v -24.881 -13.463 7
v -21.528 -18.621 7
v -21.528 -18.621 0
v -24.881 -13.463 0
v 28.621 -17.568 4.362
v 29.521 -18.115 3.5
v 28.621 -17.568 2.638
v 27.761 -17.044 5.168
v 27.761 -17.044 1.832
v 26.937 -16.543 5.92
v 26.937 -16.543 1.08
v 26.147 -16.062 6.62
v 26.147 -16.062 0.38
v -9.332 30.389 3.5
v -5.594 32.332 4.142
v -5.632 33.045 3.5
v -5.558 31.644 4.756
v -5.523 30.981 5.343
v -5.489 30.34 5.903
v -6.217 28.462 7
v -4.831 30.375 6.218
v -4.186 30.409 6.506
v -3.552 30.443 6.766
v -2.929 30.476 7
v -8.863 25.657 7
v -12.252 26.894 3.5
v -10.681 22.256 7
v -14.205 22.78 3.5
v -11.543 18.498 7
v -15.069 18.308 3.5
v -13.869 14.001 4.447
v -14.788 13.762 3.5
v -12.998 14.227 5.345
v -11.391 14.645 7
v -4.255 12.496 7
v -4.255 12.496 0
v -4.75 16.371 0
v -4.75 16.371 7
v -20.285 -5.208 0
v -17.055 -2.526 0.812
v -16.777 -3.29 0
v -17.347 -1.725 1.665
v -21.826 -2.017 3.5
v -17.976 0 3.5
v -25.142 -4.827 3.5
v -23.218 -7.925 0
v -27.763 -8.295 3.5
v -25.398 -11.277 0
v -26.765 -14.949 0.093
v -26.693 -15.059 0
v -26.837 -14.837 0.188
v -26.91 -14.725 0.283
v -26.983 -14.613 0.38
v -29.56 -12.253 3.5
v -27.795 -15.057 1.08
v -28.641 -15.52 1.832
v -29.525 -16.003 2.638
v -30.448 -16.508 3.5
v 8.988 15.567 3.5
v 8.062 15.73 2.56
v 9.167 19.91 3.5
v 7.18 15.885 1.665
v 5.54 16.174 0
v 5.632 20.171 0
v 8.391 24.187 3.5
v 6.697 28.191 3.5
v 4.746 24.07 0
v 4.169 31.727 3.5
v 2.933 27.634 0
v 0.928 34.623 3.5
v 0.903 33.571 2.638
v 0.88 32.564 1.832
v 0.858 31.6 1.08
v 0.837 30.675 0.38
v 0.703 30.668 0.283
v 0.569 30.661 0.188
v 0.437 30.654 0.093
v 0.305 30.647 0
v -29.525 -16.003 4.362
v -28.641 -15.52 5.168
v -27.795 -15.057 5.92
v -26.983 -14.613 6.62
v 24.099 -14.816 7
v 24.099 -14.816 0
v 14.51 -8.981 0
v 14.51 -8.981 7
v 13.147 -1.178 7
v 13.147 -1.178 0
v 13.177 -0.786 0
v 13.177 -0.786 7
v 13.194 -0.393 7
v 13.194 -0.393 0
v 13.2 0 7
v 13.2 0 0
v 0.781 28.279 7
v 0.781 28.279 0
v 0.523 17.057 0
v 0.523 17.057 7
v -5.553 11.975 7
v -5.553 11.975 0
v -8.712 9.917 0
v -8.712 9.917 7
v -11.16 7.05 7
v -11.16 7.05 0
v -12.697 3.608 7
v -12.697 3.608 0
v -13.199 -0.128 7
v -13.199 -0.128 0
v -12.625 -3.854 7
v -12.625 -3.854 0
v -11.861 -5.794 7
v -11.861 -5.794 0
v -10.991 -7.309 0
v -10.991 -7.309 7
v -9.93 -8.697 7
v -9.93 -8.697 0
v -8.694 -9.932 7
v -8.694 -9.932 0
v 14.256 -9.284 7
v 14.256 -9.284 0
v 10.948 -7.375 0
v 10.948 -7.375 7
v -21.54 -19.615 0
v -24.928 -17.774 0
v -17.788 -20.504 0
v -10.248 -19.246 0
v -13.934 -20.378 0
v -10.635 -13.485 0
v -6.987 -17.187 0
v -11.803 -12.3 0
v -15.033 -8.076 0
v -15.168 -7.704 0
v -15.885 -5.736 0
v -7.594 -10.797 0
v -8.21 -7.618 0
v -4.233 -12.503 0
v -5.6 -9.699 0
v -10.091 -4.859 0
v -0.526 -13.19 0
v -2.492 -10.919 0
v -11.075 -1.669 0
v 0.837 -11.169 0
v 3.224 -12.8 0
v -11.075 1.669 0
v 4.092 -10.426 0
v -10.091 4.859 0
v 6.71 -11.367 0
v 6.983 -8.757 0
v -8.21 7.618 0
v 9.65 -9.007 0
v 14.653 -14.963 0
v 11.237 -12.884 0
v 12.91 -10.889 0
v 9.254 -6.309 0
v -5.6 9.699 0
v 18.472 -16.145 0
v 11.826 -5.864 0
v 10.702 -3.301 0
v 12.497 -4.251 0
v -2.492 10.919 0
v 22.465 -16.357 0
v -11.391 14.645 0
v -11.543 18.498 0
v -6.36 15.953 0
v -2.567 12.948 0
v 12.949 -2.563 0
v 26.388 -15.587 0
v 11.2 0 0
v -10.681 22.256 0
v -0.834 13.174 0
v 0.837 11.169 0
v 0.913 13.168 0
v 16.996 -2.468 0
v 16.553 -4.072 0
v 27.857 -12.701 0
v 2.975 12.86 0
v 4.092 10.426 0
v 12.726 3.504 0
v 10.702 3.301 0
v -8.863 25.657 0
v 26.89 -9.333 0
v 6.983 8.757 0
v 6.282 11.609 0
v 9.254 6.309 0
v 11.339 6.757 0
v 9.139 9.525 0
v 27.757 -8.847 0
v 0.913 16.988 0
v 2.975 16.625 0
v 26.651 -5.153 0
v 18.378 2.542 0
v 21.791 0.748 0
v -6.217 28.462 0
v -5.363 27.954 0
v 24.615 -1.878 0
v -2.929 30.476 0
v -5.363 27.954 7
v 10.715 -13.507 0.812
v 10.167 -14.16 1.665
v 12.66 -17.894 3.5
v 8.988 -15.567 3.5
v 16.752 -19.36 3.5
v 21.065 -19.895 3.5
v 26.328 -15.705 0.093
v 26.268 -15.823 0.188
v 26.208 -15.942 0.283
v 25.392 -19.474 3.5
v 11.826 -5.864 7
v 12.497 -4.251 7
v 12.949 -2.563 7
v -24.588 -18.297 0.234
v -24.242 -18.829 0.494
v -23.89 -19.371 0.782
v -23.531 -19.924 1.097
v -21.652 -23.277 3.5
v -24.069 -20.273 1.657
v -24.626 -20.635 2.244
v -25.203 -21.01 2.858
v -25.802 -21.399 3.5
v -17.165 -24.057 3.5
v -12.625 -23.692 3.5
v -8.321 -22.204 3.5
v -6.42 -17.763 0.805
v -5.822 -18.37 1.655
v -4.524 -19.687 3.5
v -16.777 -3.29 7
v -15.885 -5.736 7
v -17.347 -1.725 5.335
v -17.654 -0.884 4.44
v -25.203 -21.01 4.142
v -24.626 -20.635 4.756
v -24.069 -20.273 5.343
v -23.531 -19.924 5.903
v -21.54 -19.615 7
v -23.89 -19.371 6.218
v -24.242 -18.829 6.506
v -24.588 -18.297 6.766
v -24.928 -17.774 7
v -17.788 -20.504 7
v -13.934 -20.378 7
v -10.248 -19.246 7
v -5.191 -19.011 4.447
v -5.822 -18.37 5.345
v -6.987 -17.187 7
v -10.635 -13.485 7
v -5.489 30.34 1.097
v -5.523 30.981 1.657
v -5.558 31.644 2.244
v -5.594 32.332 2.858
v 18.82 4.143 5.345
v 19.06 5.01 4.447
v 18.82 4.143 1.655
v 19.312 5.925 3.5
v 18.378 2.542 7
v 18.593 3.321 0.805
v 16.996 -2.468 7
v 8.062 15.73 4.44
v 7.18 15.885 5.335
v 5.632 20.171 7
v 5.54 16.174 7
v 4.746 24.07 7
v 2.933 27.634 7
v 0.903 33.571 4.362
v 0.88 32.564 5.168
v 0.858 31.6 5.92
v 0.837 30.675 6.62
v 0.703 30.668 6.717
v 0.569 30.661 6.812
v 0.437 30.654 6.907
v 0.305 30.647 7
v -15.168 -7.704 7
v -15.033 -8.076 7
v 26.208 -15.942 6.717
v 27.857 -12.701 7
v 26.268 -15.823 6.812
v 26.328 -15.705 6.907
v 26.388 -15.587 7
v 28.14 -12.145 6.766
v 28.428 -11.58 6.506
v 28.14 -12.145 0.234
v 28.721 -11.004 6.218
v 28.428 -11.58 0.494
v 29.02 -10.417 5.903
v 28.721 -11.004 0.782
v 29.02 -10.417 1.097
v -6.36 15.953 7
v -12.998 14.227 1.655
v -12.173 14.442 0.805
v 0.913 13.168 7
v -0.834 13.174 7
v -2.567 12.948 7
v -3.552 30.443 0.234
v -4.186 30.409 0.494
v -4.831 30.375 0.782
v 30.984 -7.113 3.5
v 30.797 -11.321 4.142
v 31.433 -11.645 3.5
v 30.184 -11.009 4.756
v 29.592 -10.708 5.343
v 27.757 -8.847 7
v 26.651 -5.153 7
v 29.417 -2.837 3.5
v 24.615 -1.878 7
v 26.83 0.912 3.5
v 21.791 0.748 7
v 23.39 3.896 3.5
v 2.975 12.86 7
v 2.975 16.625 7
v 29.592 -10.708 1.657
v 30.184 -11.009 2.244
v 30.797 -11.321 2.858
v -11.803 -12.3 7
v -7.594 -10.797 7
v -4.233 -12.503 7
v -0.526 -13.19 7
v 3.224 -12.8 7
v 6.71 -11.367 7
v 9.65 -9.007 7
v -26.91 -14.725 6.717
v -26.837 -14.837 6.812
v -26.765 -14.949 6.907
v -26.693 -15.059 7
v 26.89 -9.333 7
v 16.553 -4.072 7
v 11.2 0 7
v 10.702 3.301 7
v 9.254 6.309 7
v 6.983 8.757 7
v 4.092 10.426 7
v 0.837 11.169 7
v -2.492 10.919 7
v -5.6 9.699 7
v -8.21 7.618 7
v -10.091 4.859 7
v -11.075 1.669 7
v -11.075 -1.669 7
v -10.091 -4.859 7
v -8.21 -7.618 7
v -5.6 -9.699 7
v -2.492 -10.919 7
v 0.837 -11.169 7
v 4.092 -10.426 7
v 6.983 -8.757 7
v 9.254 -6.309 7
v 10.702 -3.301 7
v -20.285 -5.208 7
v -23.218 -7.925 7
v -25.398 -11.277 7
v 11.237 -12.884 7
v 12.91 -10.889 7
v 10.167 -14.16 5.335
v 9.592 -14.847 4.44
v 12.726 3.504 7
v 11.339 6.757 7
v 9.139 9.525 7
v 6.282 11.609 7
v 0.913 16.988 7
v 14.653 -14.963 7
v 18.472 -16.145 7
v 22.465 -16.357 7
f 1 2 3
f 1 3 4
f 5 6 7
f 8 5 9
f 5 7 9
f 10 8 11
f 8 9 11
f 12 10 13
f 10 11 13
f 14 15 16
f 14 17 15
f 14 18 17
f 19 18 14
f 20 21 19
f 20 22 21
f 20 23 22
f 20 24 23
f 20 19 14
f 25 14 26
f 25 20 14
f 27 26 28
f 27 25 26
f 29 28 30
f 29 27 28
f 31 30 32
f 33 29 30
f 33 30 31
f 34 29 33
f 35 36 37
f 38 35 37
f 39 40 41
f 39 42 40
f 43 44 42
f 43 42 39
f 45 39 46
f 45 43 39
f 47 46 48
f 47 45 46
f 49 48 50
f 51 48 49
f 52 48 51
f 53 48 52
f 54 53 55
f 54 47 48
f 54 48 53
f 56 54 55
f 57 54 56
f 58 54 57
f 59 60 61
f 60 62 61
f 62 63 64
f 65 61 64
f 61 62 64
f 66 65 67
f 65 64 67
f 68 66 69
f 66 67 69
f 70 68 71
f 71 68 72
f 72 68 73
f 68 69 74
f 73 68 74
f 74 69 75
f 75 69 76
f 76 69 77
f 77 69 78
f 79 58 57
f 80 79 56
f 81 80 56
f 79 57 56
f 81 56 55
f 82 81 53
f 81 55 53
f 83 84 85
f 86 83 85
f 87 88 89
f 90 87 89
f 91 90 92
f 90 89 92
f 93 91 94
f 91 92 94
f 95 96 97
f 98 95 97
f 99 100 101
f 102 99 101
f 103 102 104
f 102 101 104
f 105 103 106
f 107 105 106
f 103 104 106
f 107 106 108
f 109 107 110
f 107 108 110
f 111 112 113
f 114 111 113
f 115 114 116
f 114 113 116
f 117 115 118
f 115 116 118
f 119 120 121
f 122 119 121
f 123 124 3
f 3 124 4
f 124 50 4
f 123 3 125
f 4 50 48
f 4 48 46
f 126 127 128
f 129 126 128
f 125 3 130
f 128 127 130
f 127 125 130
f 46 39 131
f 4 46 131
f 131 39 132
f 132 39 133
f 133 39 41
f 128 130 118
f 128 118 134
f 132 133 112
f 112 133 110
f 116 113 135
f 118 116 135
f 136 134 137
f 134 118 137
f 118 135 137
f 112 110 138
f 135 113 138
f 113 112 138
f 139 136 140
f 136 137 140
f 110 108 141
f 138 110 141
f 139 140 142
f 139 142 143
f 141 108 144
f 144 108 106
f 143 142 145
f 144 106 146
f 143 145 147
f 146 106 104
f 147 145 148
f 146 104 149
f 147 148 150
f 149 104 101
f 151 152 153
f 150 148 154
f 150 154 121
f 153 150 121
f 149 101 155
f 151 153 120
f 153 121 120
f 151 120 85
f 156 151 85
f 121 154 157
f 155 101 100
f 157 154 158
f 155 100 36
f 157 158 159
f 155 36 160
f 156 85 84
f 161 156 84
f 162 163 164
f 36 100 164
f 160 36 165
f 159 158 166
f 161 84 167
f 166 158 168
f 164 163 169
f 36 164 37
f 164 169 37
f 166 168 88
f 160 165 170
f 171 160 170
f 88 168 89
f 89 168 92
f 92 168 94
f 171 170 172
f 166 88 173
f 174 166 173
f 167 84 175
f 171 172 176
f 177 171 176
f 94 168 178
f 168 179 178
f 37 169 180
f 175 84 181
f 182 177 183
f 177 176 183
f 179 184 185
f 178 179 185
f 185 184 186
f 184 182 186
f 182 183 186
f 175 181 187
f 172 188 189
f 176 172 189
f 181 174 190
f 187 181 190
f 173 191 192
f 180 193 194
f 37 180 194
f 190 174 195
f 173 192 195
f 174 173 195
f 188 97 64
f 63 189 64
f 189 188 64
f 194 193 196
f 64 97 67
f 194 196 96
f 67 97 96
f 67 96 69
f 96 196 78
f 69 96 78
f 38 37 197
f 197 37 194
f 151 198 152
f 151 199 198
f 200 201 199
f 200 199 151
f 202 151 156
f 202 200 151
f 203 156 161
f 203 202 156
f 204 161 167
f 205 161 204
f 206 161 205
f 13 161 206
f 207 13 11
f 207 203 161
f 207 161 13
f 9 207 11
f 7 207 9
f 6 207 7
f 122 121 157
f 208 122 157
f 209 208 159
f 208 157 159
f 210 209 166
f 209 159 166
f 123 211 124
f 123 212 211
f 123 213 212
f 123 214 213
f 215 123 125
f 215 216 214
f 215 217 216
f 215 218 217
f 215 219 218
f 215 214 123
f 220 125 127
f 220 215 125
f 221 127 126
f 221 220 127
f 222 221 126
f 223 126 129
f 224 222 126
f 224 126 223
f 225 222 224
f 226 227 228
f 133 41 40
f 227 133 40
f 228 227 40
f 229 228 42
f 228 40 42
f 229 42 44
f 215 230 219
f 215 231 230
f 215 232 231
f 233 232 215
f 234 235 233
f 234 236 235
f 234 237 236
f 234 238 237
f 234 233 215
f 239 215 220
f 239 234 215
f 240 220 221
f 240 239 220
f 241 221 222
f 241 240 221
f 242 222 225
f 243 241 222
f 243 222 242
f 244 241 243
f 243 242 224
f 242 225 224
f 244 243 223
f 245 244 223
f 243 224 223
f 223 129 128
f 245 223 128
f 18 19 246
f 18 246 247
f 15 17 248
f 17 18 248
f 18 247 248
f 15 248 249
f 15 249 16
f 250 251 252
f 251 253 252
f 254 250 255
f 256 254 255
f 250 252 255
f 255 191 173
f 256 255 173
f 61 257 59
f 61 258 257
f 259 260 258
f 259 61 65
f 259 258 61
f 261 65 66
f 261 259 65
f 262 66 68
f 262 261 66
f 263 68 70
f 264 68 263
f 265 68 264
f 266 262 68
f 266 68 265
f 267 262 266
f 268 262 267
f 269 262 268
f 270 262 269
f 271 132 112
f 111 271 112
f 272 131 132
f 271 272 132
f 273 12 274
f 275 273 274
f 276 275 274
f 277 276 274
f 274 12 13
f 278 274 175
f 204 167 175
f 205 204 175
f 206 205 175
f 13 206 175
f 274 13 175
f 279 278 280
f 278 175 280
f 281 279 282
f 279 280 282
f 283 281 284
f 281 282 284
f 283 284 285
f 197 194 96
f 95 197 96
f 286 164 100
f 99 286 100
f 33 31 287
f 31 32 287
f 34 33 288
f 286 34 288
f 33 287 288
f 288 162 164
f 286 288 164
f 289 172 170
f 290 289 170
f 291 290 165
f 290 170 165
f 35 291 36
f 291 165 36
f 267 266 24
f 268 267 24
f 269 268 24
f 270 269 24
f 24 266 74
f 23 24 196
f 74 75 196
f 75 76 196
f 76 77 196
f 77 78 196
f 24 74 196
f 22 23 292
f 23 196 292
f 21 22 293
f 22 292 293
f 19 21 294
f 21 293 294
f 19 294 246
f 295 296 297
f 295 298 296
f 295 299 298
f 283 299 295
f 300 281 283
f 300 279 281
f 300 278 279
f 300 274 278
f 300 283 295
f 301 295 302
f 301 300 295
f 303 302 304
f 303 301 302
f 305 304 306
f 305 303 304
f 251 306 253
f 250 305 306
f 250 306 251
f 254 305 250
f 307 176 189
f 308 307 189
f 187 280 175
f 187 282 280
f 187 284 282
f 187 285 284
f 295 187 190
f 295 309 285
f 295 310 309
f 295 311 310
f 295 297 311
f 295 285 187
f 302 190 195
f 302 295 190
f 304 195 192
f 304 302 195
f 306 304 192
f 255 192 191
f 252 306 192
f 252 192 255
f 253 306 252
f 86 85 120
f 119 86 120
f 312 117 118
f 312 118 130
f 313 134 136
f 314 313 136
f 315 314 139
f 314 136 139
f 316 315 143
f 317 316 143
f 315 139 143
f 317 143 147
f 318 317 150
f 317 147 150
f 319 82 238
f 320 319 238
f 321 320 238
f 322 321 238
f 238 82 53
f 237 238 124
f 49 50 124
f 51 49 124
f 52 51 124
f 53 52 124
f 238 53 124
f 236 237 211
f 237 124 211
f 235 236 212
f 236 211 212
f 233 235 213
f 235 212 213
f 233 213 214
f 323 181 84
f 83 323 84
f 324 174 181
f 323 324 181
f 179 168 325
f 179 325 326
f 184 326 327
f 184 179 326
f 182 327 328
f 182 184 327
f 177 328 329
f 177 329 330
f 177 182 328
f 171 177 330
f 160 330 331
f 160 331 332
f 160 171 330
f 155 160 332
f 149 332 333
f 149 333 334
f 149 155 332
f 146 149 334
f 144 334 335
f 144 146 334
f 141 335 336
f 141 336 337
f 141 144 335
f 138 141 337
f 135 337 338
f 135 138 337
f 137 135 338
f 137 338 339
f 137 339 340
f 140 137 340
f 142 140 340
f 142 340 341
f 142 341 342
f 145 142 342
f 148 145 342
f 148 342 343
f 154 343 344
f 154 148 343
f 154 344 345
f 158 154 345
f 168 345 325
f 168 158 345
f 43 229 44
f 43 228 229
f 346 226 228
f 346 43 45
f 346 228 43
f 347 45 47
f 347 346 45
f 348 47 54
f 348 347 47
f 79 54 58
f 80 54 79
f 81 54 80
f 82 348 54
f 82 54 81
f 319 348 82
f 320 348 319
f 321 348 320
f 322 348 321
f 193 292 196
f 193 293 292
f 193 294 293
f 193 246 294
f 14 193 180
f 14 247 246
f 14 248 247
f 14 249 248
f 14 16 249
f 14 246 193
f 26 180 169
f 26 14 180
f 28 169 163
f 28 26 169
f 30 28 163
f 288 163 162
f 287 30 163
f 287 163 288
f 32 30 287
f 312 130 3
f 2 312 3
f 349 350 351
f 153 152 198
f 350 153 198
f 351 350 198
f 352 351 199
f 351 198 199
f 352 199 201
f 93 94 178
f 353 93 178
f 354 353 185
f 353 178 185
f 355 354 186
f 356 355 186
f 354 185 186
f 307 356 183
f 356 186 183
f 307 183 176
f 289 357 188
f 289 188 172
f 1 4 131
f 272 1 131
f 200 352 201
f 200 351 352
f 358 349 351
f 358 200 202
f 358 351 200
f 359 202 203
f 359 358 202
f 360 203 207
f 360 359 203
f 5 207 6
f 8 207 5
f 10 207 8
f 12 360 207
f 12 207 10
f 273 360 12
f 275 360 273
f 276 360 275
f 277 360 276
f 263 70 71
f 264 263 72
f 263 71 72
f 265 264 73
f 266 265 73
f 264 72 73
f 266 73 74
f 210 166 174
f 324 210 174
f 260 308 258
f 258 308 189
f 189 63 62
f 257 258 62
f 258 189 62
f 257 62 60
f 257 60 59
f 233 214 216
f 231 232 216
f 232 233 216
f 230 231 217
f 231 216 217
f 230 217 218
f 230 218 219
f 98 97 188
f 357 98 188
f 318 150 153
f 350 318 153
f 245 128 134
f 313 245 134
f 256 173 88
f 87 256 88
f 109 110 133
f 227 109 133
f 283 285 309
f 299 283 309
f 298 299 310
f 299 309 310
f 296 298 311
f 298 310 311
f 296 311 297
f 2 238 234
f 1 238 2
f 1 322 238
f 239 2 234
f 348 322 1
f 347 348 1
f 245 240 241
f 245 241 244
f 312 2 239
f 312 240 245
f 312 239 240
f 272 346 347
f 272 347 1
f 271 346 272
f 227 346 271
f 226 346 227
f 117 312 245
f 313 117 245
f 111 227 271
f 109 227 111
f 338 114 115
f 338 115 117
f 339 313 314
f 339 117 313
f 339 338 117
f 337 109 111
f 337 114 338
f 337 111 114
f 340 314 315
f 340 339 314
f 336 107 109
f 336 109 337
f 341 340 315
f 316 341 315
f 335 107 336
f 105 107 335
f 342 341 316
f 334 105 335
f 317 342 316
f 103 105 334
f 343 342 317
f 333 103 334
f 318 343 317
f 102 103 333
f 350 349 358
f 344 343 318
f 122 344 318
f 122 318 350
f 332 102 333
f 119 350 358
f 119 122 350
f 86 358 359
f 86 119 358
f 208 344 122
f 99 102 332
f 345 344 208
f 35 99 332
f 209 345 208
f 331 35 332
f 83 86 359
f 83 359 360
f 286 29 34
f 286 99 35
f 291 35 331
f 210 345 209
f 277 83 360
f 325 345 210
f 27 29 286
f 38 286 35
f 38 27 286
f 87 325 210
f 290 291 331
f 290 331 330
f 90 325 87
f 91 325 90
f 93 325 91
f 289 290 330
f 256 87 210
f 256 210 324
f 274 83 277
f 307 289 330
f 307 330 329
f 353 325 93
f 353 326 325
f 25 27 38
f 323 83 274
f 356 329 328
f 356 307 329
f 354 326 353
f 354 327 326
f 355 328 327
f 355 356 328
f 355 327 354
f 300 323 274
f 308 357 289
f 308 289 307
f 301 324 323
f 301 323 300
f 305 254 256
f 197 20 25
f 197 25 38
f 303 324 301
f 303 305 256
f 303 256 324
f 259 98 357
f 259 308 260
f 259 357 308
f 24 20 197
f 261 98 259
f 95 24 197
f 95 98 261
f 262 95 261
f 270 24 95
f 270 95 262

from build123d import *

# Parameters (mm, degrees)
F0_R     = 11.2
F1_DEPTH = 7
F2_SIZE  = 3.5
F3_SIZE  = 3.49999


# Not quite as in the source:
# - a fillet or chamfer is up to 0.001 mm smaller than in the source, because OpenCascade refuses the exact size


with BuildPart() as f1:
    # F0 (on Top) → F1 (new body)
    with BuildSketch(Plane.XY):
        Polygon((-5.4887417888, 30.3404310419), (-5.3626246511, 27.9541106613), (0.7814850479, 28.2788271306), (0.8367048606, 30.6747311771), align=None)
        with BuildLine():
            Line((-6.3603435788, 15.9527909689), (-4.7504720739, 16.3712901342))
            Line((-4.7504720739, 16.3712901342), (-5.3626246511, 27.9541106613))
            Line((-5.3626246511, 27.9541106613), (-5.4887417888, 30.3404310419))
            Line((-5.4887417888, 30.3404310419), (-5.6316571191, 33.0445977541))
            ThreePointArc((-5.6316571191, 33.0445977541), (-13.3586462682, 24.898567552), (-14.7876461409, 13.7620452616))
            Line((-14.7876461409, 13.7620452616), (-6.3603435788, 15.9527909689))
        make_face()
        with BuildLine():
            ThreePointArc((-5.5532608378, 11.975027936), (-4.9107856444, 12.2525174701), (-4.2545066222, 12.4955661497))
            Line((-4.2545066222, 12.4955661497), (-4.7504720739, 16.3712901342))
            Line((-4.7504720739, 16.3712901342), (-6.3603435788, 15.9527909689))
            Line((-6.3603435788, 15.9527909689), (-5.5532608378, 11.975027936))
        make_face()
        with BuildLine():
            Line((0.912733085, 16.988074322), (2.9751978168, 16.625185455))
            Line((2.9751978168, 16.625185455), (8.9877722785, 15.5672782332))
            ThreePointArc((8.9877722785, 15.5672782332), (7.6544413443, 26.2358342161), (0.9277061572, 34.6231396156))
            Line((0.9277061572, 34.6231396156), (0.8367048606, 30.6747311771))
            Line((0.8367048606, 30.6747311771), (0.7814850479, 28.2788271306))
            Line((0.7814850479, 28.2788271306), (0.5228415025, 17.0566754052))
            Line((0.5228415025, 17.0566754052), (0.912733085, 16.988074322))
        make_face()
        with BuildLine():
            ThreePointArc((0.912733085, 13.1684060659), (1.9500586477, 13.055162629), (2.9751978168, 12.8603342861))
            Line((2.9751978168, 12.8603342861), (2.9751978168, 16.625185455))
            Line((2.9751978168, 16.625185455), (0.912733085, 16.988074322))
            Line((0.912733085, 16.988074322), (0.912733085, 13.1684060659))
        make_face()
        with BuildLine():
            ThreePointArc((13.1473088225, -1.1782490086), (13.1868206262, -0.5897132961), (13.2, 0))
            ThreePointArc((13.2, 0), (10.3322943043, 8.214845976), (2.9751978168, 12.8603342861))
            ThreePointArc((2.9751978168, 12.8603342861), (1.9500586477, 13.055162629), (0.912733085, 13.1684060659))
            ThreePointArc((0.912733085, 13.1684060659), (-1.7044180771, 13.089498043), (-4.2545066222, 12.4955661497))
            ThreePointArc((-4.2545066222, 12.4955661497), (-4.9107856444, 12.2525174701), (-5.5532608378, 11.975027936))
            ThreePointArc((-5.5532608378, 11.975027936), (-12.0518959346, 5.3844038094), (-12.6249751013, -3.8535702524))
            ThreePointArc((-12.6249751013, -3.8535702524), (-12.2811318111, -4.8387809867), (-11.8605407229, -5.7937529945))
            ThreePointArc((-11.8605407229, -5.7937529945), (-10.4836287895, -8.020818375), (-8.6942244092, -9.9322938902))
            ThreePointArc((-8.6942244092, -9.9322938902), (-8.1555985672, -10.3791238557), (-7.5940479846, -10.7967789274))
            ThreePointArc((-7.5940479846, -10.7967789274), (1.3629174841, -13.1294499478), (9.6497772845, -9.0067640337))
            ThreePointArc((9.6497772845, -9.0067640337), (10.3310731634, -8.2163816423), (10.9478076379, -7.3746530714))
            ThreePointArc((10.9478076379, -7.3746530714), (12.1880468666, -5.068679668), (12.9487310314, -2.5632722595))
            ThreePointArc((12.9487310314, -2.5632722595), (13.0663842116, -1.8733936144), (13.1473088225, -1.1782490086))
        make_face()
        Circle(F0_R, mode=Mode.SUBTRACT)
        with BuildLine():
            Line((-15.1684704667, -7.7035871225), (-15.885431855, -5.7359958369))
            Line((-15.885431855, -5.7359958369), (-17.975544557, 0))
            ThreePointArc((-17.975544557, 0), (-26.5481195928, -6.4889764521), (-30.4483715445, -16.5081527084))
            Line((-30.4483715445, -16.5081527084), (-26.983448884, -14.6127579238))
            Line((-26.983448884, -14.6127579238), (-24.8809252083, -13.4626276612))
            Line((-24.8809252083, -13.4626276612), (-15.0329349563, -8.0755436793))
            Line((-15.0329349563, -8.0755436793), (-15.1684704667, -7.7035871225))
        make_face()
        with BuildLine():
            ThreePointArc((-11.8605407229, -5.7937529945), (-12.2811318111, -4.8387809867), (-12.6249751013, -3.8535702524))
            Line((-12.6249751013, -3.8535702524), (-15.885431855, -5.7359958369))
            Line((-15.885431855, -5.7359958369), (-15.1684704667, -7.7035871225))
            Line((-15.1684704667, -7.7035871225), (-11.8605407229, -5.7937529945))
        make_face()
        with BuildLine():
            Line((-10.6353504509, -13.4846146005), (-7.5940479846, -10.7967789274))
            ThreePointArc((-7.5940479846, -10.7967789274), (-8.1555985672, -10.3791238557), (-8.6942244092, -9.9322938902))
            Line((-8.6942244092, -9.9322938902), (-11.802717112, -12.2996745631))
            Line((-11.802717112, -12.2996745631), (-10.6353504509, -13.4846146005))
        make_face()
        with BuildLine():
            Line((-4.5244577341, -19.687499851), (-10.6353504509, -13.4846146005))
            Line((-10.6353504509, -13.4846146005), (-11.802717112, -12.2996745631))
            Line((-11.802717112, -12.2996745631), (-21.5276576473, -18.6212245095))
            Line((-21.5276576473, -18.6212245095), (-23.5312131497, -19.9236053449))
            Line((-23.5312131497, -19.9236053449), (-25.8016325533, -21.3994570076))
            ThreePointArc((-25.8016325533, -21.3994570076), (-14.8834688838, -24.0182108044), (-4.5244577341, -19.687499851))
        make_face()
        Polygon((-23.5312131497, -19.9236053449), (-21.5276576473, -18.6212245095), (-24.8809252083, -13.4626276612), (-26.983448884, -14.6127579238), align=None)
        with BuildLine():
            Line((14.2557373817, -9.2844871995), (10.9478076379, -7.3746530714))
            ThreePointArc((10.9478076379, -7.3746530714), (10.3310731634, -8.2163816423), (9.6497772845, -9.0067640337))
            Line((9.6497772845, -9.0067640337), (12.9102340382, -10.8891896181))
            Line((12.9102340382, -10.8891896181), (14.2557373817, -9.2844871995))
        make_face()
        with BuildLine():
            Line((14.5100934538, -8.9811317259), (14.2557373817, -9.2844871995))
            Line((14.2557373817, -9.2844871995), (12.9102340382, -10.8891896181))
            Line((12.9102340382, -10.8891896181), (8.9877722785, -15.5672782332))
            ThreePointArc((8.9877722785, -15.5672782332), (18.8936782485, -19.746857764), (29.5206653873, -18.1149869072))
            Line((29.5206653873, -18.1149869072), (26.1467440233, -16.0619732533))
            Line((26.1467440233, -16.0619732533), (24.0994401604, -14.8161994695))
            Line((24.0994401604, -14.8161994695), (14.5100934538, -8.9811317259))
        make_face()
        Polygon((29.0199549385, -10.416825697), (26.8902822984, -9.3328861518), (24.0994401604, -14.8161994695), (26.1467440233, -16.0619732533), align=None)
        with BuildLine():
            Line((19.312103875, 5.9254545894), (16.9956940297, -2.4681763684))
            Line((16.9956940297, -2.4681763684), (16.5531891859, -4.0716155711))
            Line((16.5531891859, -4.0716155711), (26.8902822984, -9.3328861518))
            Line((26.8902822984, -9.3328861518), (29.0199549385, -10.416825697))
            Line((29.0199549385, -10.416825697), (31.4332896725, -11.6451407465))
            ThreePointArc((31.4332896725, -11.6451407465), (28.242115152, -0.8803567476), (19.312103875, 5.9254545894))
        make_face()
        with BuildLine():
            Line((16.9956940297, -2.4681763684), (13.1473088225, -1.1782490086))
            ThreePointArc((13.1473088225, -1.1782490086), (13.0663842116, -1.8733936144), (12.9487310314, -2.5632722595))
            Line((12.9487310314, -2.5632722595), (16.5531891859, -4.0716155711))
            Line((16.5531891859, -4.0716155711), (16.9956940297, -2.4681763684))
        make_face()
    extrude(amount=F1_DEPTH)

    # F2
    f2_edges = [f1.edges().sort_by_distance(p)[0] for p in [
        (-13.358646, 24.898568, 7),
        (7.654441, 26.235834, 7),
        (28.242115, -0.880357, 7),
        (18.893678, -19.746858, 7),
        (-14.883469, -24.018211, 7),
        (-26.54812, -6.488976, 7),
    ]]
    chamfer(f2_edges, length=F2_SIZE)

    # F3 (size 3.5 in the source; OpenCascade refuses exactly that, so slightly less here)
    f3_edges = [f1.edges().sort_by_distance(p)[0] for p in [
        (7.654441, 26.235834, 0),
        (-13.358646, 24.898568, 0),
        (-26.54812, -6.488976, 0),
        (-14.883469, -24.018211, 0),
        (18.893678, -19.746858, 0),
        (28.242115, -0.880357, 0),
    ]]
    chamfer(f3_edges, length=F3_SIZE)


solid = f1.part
